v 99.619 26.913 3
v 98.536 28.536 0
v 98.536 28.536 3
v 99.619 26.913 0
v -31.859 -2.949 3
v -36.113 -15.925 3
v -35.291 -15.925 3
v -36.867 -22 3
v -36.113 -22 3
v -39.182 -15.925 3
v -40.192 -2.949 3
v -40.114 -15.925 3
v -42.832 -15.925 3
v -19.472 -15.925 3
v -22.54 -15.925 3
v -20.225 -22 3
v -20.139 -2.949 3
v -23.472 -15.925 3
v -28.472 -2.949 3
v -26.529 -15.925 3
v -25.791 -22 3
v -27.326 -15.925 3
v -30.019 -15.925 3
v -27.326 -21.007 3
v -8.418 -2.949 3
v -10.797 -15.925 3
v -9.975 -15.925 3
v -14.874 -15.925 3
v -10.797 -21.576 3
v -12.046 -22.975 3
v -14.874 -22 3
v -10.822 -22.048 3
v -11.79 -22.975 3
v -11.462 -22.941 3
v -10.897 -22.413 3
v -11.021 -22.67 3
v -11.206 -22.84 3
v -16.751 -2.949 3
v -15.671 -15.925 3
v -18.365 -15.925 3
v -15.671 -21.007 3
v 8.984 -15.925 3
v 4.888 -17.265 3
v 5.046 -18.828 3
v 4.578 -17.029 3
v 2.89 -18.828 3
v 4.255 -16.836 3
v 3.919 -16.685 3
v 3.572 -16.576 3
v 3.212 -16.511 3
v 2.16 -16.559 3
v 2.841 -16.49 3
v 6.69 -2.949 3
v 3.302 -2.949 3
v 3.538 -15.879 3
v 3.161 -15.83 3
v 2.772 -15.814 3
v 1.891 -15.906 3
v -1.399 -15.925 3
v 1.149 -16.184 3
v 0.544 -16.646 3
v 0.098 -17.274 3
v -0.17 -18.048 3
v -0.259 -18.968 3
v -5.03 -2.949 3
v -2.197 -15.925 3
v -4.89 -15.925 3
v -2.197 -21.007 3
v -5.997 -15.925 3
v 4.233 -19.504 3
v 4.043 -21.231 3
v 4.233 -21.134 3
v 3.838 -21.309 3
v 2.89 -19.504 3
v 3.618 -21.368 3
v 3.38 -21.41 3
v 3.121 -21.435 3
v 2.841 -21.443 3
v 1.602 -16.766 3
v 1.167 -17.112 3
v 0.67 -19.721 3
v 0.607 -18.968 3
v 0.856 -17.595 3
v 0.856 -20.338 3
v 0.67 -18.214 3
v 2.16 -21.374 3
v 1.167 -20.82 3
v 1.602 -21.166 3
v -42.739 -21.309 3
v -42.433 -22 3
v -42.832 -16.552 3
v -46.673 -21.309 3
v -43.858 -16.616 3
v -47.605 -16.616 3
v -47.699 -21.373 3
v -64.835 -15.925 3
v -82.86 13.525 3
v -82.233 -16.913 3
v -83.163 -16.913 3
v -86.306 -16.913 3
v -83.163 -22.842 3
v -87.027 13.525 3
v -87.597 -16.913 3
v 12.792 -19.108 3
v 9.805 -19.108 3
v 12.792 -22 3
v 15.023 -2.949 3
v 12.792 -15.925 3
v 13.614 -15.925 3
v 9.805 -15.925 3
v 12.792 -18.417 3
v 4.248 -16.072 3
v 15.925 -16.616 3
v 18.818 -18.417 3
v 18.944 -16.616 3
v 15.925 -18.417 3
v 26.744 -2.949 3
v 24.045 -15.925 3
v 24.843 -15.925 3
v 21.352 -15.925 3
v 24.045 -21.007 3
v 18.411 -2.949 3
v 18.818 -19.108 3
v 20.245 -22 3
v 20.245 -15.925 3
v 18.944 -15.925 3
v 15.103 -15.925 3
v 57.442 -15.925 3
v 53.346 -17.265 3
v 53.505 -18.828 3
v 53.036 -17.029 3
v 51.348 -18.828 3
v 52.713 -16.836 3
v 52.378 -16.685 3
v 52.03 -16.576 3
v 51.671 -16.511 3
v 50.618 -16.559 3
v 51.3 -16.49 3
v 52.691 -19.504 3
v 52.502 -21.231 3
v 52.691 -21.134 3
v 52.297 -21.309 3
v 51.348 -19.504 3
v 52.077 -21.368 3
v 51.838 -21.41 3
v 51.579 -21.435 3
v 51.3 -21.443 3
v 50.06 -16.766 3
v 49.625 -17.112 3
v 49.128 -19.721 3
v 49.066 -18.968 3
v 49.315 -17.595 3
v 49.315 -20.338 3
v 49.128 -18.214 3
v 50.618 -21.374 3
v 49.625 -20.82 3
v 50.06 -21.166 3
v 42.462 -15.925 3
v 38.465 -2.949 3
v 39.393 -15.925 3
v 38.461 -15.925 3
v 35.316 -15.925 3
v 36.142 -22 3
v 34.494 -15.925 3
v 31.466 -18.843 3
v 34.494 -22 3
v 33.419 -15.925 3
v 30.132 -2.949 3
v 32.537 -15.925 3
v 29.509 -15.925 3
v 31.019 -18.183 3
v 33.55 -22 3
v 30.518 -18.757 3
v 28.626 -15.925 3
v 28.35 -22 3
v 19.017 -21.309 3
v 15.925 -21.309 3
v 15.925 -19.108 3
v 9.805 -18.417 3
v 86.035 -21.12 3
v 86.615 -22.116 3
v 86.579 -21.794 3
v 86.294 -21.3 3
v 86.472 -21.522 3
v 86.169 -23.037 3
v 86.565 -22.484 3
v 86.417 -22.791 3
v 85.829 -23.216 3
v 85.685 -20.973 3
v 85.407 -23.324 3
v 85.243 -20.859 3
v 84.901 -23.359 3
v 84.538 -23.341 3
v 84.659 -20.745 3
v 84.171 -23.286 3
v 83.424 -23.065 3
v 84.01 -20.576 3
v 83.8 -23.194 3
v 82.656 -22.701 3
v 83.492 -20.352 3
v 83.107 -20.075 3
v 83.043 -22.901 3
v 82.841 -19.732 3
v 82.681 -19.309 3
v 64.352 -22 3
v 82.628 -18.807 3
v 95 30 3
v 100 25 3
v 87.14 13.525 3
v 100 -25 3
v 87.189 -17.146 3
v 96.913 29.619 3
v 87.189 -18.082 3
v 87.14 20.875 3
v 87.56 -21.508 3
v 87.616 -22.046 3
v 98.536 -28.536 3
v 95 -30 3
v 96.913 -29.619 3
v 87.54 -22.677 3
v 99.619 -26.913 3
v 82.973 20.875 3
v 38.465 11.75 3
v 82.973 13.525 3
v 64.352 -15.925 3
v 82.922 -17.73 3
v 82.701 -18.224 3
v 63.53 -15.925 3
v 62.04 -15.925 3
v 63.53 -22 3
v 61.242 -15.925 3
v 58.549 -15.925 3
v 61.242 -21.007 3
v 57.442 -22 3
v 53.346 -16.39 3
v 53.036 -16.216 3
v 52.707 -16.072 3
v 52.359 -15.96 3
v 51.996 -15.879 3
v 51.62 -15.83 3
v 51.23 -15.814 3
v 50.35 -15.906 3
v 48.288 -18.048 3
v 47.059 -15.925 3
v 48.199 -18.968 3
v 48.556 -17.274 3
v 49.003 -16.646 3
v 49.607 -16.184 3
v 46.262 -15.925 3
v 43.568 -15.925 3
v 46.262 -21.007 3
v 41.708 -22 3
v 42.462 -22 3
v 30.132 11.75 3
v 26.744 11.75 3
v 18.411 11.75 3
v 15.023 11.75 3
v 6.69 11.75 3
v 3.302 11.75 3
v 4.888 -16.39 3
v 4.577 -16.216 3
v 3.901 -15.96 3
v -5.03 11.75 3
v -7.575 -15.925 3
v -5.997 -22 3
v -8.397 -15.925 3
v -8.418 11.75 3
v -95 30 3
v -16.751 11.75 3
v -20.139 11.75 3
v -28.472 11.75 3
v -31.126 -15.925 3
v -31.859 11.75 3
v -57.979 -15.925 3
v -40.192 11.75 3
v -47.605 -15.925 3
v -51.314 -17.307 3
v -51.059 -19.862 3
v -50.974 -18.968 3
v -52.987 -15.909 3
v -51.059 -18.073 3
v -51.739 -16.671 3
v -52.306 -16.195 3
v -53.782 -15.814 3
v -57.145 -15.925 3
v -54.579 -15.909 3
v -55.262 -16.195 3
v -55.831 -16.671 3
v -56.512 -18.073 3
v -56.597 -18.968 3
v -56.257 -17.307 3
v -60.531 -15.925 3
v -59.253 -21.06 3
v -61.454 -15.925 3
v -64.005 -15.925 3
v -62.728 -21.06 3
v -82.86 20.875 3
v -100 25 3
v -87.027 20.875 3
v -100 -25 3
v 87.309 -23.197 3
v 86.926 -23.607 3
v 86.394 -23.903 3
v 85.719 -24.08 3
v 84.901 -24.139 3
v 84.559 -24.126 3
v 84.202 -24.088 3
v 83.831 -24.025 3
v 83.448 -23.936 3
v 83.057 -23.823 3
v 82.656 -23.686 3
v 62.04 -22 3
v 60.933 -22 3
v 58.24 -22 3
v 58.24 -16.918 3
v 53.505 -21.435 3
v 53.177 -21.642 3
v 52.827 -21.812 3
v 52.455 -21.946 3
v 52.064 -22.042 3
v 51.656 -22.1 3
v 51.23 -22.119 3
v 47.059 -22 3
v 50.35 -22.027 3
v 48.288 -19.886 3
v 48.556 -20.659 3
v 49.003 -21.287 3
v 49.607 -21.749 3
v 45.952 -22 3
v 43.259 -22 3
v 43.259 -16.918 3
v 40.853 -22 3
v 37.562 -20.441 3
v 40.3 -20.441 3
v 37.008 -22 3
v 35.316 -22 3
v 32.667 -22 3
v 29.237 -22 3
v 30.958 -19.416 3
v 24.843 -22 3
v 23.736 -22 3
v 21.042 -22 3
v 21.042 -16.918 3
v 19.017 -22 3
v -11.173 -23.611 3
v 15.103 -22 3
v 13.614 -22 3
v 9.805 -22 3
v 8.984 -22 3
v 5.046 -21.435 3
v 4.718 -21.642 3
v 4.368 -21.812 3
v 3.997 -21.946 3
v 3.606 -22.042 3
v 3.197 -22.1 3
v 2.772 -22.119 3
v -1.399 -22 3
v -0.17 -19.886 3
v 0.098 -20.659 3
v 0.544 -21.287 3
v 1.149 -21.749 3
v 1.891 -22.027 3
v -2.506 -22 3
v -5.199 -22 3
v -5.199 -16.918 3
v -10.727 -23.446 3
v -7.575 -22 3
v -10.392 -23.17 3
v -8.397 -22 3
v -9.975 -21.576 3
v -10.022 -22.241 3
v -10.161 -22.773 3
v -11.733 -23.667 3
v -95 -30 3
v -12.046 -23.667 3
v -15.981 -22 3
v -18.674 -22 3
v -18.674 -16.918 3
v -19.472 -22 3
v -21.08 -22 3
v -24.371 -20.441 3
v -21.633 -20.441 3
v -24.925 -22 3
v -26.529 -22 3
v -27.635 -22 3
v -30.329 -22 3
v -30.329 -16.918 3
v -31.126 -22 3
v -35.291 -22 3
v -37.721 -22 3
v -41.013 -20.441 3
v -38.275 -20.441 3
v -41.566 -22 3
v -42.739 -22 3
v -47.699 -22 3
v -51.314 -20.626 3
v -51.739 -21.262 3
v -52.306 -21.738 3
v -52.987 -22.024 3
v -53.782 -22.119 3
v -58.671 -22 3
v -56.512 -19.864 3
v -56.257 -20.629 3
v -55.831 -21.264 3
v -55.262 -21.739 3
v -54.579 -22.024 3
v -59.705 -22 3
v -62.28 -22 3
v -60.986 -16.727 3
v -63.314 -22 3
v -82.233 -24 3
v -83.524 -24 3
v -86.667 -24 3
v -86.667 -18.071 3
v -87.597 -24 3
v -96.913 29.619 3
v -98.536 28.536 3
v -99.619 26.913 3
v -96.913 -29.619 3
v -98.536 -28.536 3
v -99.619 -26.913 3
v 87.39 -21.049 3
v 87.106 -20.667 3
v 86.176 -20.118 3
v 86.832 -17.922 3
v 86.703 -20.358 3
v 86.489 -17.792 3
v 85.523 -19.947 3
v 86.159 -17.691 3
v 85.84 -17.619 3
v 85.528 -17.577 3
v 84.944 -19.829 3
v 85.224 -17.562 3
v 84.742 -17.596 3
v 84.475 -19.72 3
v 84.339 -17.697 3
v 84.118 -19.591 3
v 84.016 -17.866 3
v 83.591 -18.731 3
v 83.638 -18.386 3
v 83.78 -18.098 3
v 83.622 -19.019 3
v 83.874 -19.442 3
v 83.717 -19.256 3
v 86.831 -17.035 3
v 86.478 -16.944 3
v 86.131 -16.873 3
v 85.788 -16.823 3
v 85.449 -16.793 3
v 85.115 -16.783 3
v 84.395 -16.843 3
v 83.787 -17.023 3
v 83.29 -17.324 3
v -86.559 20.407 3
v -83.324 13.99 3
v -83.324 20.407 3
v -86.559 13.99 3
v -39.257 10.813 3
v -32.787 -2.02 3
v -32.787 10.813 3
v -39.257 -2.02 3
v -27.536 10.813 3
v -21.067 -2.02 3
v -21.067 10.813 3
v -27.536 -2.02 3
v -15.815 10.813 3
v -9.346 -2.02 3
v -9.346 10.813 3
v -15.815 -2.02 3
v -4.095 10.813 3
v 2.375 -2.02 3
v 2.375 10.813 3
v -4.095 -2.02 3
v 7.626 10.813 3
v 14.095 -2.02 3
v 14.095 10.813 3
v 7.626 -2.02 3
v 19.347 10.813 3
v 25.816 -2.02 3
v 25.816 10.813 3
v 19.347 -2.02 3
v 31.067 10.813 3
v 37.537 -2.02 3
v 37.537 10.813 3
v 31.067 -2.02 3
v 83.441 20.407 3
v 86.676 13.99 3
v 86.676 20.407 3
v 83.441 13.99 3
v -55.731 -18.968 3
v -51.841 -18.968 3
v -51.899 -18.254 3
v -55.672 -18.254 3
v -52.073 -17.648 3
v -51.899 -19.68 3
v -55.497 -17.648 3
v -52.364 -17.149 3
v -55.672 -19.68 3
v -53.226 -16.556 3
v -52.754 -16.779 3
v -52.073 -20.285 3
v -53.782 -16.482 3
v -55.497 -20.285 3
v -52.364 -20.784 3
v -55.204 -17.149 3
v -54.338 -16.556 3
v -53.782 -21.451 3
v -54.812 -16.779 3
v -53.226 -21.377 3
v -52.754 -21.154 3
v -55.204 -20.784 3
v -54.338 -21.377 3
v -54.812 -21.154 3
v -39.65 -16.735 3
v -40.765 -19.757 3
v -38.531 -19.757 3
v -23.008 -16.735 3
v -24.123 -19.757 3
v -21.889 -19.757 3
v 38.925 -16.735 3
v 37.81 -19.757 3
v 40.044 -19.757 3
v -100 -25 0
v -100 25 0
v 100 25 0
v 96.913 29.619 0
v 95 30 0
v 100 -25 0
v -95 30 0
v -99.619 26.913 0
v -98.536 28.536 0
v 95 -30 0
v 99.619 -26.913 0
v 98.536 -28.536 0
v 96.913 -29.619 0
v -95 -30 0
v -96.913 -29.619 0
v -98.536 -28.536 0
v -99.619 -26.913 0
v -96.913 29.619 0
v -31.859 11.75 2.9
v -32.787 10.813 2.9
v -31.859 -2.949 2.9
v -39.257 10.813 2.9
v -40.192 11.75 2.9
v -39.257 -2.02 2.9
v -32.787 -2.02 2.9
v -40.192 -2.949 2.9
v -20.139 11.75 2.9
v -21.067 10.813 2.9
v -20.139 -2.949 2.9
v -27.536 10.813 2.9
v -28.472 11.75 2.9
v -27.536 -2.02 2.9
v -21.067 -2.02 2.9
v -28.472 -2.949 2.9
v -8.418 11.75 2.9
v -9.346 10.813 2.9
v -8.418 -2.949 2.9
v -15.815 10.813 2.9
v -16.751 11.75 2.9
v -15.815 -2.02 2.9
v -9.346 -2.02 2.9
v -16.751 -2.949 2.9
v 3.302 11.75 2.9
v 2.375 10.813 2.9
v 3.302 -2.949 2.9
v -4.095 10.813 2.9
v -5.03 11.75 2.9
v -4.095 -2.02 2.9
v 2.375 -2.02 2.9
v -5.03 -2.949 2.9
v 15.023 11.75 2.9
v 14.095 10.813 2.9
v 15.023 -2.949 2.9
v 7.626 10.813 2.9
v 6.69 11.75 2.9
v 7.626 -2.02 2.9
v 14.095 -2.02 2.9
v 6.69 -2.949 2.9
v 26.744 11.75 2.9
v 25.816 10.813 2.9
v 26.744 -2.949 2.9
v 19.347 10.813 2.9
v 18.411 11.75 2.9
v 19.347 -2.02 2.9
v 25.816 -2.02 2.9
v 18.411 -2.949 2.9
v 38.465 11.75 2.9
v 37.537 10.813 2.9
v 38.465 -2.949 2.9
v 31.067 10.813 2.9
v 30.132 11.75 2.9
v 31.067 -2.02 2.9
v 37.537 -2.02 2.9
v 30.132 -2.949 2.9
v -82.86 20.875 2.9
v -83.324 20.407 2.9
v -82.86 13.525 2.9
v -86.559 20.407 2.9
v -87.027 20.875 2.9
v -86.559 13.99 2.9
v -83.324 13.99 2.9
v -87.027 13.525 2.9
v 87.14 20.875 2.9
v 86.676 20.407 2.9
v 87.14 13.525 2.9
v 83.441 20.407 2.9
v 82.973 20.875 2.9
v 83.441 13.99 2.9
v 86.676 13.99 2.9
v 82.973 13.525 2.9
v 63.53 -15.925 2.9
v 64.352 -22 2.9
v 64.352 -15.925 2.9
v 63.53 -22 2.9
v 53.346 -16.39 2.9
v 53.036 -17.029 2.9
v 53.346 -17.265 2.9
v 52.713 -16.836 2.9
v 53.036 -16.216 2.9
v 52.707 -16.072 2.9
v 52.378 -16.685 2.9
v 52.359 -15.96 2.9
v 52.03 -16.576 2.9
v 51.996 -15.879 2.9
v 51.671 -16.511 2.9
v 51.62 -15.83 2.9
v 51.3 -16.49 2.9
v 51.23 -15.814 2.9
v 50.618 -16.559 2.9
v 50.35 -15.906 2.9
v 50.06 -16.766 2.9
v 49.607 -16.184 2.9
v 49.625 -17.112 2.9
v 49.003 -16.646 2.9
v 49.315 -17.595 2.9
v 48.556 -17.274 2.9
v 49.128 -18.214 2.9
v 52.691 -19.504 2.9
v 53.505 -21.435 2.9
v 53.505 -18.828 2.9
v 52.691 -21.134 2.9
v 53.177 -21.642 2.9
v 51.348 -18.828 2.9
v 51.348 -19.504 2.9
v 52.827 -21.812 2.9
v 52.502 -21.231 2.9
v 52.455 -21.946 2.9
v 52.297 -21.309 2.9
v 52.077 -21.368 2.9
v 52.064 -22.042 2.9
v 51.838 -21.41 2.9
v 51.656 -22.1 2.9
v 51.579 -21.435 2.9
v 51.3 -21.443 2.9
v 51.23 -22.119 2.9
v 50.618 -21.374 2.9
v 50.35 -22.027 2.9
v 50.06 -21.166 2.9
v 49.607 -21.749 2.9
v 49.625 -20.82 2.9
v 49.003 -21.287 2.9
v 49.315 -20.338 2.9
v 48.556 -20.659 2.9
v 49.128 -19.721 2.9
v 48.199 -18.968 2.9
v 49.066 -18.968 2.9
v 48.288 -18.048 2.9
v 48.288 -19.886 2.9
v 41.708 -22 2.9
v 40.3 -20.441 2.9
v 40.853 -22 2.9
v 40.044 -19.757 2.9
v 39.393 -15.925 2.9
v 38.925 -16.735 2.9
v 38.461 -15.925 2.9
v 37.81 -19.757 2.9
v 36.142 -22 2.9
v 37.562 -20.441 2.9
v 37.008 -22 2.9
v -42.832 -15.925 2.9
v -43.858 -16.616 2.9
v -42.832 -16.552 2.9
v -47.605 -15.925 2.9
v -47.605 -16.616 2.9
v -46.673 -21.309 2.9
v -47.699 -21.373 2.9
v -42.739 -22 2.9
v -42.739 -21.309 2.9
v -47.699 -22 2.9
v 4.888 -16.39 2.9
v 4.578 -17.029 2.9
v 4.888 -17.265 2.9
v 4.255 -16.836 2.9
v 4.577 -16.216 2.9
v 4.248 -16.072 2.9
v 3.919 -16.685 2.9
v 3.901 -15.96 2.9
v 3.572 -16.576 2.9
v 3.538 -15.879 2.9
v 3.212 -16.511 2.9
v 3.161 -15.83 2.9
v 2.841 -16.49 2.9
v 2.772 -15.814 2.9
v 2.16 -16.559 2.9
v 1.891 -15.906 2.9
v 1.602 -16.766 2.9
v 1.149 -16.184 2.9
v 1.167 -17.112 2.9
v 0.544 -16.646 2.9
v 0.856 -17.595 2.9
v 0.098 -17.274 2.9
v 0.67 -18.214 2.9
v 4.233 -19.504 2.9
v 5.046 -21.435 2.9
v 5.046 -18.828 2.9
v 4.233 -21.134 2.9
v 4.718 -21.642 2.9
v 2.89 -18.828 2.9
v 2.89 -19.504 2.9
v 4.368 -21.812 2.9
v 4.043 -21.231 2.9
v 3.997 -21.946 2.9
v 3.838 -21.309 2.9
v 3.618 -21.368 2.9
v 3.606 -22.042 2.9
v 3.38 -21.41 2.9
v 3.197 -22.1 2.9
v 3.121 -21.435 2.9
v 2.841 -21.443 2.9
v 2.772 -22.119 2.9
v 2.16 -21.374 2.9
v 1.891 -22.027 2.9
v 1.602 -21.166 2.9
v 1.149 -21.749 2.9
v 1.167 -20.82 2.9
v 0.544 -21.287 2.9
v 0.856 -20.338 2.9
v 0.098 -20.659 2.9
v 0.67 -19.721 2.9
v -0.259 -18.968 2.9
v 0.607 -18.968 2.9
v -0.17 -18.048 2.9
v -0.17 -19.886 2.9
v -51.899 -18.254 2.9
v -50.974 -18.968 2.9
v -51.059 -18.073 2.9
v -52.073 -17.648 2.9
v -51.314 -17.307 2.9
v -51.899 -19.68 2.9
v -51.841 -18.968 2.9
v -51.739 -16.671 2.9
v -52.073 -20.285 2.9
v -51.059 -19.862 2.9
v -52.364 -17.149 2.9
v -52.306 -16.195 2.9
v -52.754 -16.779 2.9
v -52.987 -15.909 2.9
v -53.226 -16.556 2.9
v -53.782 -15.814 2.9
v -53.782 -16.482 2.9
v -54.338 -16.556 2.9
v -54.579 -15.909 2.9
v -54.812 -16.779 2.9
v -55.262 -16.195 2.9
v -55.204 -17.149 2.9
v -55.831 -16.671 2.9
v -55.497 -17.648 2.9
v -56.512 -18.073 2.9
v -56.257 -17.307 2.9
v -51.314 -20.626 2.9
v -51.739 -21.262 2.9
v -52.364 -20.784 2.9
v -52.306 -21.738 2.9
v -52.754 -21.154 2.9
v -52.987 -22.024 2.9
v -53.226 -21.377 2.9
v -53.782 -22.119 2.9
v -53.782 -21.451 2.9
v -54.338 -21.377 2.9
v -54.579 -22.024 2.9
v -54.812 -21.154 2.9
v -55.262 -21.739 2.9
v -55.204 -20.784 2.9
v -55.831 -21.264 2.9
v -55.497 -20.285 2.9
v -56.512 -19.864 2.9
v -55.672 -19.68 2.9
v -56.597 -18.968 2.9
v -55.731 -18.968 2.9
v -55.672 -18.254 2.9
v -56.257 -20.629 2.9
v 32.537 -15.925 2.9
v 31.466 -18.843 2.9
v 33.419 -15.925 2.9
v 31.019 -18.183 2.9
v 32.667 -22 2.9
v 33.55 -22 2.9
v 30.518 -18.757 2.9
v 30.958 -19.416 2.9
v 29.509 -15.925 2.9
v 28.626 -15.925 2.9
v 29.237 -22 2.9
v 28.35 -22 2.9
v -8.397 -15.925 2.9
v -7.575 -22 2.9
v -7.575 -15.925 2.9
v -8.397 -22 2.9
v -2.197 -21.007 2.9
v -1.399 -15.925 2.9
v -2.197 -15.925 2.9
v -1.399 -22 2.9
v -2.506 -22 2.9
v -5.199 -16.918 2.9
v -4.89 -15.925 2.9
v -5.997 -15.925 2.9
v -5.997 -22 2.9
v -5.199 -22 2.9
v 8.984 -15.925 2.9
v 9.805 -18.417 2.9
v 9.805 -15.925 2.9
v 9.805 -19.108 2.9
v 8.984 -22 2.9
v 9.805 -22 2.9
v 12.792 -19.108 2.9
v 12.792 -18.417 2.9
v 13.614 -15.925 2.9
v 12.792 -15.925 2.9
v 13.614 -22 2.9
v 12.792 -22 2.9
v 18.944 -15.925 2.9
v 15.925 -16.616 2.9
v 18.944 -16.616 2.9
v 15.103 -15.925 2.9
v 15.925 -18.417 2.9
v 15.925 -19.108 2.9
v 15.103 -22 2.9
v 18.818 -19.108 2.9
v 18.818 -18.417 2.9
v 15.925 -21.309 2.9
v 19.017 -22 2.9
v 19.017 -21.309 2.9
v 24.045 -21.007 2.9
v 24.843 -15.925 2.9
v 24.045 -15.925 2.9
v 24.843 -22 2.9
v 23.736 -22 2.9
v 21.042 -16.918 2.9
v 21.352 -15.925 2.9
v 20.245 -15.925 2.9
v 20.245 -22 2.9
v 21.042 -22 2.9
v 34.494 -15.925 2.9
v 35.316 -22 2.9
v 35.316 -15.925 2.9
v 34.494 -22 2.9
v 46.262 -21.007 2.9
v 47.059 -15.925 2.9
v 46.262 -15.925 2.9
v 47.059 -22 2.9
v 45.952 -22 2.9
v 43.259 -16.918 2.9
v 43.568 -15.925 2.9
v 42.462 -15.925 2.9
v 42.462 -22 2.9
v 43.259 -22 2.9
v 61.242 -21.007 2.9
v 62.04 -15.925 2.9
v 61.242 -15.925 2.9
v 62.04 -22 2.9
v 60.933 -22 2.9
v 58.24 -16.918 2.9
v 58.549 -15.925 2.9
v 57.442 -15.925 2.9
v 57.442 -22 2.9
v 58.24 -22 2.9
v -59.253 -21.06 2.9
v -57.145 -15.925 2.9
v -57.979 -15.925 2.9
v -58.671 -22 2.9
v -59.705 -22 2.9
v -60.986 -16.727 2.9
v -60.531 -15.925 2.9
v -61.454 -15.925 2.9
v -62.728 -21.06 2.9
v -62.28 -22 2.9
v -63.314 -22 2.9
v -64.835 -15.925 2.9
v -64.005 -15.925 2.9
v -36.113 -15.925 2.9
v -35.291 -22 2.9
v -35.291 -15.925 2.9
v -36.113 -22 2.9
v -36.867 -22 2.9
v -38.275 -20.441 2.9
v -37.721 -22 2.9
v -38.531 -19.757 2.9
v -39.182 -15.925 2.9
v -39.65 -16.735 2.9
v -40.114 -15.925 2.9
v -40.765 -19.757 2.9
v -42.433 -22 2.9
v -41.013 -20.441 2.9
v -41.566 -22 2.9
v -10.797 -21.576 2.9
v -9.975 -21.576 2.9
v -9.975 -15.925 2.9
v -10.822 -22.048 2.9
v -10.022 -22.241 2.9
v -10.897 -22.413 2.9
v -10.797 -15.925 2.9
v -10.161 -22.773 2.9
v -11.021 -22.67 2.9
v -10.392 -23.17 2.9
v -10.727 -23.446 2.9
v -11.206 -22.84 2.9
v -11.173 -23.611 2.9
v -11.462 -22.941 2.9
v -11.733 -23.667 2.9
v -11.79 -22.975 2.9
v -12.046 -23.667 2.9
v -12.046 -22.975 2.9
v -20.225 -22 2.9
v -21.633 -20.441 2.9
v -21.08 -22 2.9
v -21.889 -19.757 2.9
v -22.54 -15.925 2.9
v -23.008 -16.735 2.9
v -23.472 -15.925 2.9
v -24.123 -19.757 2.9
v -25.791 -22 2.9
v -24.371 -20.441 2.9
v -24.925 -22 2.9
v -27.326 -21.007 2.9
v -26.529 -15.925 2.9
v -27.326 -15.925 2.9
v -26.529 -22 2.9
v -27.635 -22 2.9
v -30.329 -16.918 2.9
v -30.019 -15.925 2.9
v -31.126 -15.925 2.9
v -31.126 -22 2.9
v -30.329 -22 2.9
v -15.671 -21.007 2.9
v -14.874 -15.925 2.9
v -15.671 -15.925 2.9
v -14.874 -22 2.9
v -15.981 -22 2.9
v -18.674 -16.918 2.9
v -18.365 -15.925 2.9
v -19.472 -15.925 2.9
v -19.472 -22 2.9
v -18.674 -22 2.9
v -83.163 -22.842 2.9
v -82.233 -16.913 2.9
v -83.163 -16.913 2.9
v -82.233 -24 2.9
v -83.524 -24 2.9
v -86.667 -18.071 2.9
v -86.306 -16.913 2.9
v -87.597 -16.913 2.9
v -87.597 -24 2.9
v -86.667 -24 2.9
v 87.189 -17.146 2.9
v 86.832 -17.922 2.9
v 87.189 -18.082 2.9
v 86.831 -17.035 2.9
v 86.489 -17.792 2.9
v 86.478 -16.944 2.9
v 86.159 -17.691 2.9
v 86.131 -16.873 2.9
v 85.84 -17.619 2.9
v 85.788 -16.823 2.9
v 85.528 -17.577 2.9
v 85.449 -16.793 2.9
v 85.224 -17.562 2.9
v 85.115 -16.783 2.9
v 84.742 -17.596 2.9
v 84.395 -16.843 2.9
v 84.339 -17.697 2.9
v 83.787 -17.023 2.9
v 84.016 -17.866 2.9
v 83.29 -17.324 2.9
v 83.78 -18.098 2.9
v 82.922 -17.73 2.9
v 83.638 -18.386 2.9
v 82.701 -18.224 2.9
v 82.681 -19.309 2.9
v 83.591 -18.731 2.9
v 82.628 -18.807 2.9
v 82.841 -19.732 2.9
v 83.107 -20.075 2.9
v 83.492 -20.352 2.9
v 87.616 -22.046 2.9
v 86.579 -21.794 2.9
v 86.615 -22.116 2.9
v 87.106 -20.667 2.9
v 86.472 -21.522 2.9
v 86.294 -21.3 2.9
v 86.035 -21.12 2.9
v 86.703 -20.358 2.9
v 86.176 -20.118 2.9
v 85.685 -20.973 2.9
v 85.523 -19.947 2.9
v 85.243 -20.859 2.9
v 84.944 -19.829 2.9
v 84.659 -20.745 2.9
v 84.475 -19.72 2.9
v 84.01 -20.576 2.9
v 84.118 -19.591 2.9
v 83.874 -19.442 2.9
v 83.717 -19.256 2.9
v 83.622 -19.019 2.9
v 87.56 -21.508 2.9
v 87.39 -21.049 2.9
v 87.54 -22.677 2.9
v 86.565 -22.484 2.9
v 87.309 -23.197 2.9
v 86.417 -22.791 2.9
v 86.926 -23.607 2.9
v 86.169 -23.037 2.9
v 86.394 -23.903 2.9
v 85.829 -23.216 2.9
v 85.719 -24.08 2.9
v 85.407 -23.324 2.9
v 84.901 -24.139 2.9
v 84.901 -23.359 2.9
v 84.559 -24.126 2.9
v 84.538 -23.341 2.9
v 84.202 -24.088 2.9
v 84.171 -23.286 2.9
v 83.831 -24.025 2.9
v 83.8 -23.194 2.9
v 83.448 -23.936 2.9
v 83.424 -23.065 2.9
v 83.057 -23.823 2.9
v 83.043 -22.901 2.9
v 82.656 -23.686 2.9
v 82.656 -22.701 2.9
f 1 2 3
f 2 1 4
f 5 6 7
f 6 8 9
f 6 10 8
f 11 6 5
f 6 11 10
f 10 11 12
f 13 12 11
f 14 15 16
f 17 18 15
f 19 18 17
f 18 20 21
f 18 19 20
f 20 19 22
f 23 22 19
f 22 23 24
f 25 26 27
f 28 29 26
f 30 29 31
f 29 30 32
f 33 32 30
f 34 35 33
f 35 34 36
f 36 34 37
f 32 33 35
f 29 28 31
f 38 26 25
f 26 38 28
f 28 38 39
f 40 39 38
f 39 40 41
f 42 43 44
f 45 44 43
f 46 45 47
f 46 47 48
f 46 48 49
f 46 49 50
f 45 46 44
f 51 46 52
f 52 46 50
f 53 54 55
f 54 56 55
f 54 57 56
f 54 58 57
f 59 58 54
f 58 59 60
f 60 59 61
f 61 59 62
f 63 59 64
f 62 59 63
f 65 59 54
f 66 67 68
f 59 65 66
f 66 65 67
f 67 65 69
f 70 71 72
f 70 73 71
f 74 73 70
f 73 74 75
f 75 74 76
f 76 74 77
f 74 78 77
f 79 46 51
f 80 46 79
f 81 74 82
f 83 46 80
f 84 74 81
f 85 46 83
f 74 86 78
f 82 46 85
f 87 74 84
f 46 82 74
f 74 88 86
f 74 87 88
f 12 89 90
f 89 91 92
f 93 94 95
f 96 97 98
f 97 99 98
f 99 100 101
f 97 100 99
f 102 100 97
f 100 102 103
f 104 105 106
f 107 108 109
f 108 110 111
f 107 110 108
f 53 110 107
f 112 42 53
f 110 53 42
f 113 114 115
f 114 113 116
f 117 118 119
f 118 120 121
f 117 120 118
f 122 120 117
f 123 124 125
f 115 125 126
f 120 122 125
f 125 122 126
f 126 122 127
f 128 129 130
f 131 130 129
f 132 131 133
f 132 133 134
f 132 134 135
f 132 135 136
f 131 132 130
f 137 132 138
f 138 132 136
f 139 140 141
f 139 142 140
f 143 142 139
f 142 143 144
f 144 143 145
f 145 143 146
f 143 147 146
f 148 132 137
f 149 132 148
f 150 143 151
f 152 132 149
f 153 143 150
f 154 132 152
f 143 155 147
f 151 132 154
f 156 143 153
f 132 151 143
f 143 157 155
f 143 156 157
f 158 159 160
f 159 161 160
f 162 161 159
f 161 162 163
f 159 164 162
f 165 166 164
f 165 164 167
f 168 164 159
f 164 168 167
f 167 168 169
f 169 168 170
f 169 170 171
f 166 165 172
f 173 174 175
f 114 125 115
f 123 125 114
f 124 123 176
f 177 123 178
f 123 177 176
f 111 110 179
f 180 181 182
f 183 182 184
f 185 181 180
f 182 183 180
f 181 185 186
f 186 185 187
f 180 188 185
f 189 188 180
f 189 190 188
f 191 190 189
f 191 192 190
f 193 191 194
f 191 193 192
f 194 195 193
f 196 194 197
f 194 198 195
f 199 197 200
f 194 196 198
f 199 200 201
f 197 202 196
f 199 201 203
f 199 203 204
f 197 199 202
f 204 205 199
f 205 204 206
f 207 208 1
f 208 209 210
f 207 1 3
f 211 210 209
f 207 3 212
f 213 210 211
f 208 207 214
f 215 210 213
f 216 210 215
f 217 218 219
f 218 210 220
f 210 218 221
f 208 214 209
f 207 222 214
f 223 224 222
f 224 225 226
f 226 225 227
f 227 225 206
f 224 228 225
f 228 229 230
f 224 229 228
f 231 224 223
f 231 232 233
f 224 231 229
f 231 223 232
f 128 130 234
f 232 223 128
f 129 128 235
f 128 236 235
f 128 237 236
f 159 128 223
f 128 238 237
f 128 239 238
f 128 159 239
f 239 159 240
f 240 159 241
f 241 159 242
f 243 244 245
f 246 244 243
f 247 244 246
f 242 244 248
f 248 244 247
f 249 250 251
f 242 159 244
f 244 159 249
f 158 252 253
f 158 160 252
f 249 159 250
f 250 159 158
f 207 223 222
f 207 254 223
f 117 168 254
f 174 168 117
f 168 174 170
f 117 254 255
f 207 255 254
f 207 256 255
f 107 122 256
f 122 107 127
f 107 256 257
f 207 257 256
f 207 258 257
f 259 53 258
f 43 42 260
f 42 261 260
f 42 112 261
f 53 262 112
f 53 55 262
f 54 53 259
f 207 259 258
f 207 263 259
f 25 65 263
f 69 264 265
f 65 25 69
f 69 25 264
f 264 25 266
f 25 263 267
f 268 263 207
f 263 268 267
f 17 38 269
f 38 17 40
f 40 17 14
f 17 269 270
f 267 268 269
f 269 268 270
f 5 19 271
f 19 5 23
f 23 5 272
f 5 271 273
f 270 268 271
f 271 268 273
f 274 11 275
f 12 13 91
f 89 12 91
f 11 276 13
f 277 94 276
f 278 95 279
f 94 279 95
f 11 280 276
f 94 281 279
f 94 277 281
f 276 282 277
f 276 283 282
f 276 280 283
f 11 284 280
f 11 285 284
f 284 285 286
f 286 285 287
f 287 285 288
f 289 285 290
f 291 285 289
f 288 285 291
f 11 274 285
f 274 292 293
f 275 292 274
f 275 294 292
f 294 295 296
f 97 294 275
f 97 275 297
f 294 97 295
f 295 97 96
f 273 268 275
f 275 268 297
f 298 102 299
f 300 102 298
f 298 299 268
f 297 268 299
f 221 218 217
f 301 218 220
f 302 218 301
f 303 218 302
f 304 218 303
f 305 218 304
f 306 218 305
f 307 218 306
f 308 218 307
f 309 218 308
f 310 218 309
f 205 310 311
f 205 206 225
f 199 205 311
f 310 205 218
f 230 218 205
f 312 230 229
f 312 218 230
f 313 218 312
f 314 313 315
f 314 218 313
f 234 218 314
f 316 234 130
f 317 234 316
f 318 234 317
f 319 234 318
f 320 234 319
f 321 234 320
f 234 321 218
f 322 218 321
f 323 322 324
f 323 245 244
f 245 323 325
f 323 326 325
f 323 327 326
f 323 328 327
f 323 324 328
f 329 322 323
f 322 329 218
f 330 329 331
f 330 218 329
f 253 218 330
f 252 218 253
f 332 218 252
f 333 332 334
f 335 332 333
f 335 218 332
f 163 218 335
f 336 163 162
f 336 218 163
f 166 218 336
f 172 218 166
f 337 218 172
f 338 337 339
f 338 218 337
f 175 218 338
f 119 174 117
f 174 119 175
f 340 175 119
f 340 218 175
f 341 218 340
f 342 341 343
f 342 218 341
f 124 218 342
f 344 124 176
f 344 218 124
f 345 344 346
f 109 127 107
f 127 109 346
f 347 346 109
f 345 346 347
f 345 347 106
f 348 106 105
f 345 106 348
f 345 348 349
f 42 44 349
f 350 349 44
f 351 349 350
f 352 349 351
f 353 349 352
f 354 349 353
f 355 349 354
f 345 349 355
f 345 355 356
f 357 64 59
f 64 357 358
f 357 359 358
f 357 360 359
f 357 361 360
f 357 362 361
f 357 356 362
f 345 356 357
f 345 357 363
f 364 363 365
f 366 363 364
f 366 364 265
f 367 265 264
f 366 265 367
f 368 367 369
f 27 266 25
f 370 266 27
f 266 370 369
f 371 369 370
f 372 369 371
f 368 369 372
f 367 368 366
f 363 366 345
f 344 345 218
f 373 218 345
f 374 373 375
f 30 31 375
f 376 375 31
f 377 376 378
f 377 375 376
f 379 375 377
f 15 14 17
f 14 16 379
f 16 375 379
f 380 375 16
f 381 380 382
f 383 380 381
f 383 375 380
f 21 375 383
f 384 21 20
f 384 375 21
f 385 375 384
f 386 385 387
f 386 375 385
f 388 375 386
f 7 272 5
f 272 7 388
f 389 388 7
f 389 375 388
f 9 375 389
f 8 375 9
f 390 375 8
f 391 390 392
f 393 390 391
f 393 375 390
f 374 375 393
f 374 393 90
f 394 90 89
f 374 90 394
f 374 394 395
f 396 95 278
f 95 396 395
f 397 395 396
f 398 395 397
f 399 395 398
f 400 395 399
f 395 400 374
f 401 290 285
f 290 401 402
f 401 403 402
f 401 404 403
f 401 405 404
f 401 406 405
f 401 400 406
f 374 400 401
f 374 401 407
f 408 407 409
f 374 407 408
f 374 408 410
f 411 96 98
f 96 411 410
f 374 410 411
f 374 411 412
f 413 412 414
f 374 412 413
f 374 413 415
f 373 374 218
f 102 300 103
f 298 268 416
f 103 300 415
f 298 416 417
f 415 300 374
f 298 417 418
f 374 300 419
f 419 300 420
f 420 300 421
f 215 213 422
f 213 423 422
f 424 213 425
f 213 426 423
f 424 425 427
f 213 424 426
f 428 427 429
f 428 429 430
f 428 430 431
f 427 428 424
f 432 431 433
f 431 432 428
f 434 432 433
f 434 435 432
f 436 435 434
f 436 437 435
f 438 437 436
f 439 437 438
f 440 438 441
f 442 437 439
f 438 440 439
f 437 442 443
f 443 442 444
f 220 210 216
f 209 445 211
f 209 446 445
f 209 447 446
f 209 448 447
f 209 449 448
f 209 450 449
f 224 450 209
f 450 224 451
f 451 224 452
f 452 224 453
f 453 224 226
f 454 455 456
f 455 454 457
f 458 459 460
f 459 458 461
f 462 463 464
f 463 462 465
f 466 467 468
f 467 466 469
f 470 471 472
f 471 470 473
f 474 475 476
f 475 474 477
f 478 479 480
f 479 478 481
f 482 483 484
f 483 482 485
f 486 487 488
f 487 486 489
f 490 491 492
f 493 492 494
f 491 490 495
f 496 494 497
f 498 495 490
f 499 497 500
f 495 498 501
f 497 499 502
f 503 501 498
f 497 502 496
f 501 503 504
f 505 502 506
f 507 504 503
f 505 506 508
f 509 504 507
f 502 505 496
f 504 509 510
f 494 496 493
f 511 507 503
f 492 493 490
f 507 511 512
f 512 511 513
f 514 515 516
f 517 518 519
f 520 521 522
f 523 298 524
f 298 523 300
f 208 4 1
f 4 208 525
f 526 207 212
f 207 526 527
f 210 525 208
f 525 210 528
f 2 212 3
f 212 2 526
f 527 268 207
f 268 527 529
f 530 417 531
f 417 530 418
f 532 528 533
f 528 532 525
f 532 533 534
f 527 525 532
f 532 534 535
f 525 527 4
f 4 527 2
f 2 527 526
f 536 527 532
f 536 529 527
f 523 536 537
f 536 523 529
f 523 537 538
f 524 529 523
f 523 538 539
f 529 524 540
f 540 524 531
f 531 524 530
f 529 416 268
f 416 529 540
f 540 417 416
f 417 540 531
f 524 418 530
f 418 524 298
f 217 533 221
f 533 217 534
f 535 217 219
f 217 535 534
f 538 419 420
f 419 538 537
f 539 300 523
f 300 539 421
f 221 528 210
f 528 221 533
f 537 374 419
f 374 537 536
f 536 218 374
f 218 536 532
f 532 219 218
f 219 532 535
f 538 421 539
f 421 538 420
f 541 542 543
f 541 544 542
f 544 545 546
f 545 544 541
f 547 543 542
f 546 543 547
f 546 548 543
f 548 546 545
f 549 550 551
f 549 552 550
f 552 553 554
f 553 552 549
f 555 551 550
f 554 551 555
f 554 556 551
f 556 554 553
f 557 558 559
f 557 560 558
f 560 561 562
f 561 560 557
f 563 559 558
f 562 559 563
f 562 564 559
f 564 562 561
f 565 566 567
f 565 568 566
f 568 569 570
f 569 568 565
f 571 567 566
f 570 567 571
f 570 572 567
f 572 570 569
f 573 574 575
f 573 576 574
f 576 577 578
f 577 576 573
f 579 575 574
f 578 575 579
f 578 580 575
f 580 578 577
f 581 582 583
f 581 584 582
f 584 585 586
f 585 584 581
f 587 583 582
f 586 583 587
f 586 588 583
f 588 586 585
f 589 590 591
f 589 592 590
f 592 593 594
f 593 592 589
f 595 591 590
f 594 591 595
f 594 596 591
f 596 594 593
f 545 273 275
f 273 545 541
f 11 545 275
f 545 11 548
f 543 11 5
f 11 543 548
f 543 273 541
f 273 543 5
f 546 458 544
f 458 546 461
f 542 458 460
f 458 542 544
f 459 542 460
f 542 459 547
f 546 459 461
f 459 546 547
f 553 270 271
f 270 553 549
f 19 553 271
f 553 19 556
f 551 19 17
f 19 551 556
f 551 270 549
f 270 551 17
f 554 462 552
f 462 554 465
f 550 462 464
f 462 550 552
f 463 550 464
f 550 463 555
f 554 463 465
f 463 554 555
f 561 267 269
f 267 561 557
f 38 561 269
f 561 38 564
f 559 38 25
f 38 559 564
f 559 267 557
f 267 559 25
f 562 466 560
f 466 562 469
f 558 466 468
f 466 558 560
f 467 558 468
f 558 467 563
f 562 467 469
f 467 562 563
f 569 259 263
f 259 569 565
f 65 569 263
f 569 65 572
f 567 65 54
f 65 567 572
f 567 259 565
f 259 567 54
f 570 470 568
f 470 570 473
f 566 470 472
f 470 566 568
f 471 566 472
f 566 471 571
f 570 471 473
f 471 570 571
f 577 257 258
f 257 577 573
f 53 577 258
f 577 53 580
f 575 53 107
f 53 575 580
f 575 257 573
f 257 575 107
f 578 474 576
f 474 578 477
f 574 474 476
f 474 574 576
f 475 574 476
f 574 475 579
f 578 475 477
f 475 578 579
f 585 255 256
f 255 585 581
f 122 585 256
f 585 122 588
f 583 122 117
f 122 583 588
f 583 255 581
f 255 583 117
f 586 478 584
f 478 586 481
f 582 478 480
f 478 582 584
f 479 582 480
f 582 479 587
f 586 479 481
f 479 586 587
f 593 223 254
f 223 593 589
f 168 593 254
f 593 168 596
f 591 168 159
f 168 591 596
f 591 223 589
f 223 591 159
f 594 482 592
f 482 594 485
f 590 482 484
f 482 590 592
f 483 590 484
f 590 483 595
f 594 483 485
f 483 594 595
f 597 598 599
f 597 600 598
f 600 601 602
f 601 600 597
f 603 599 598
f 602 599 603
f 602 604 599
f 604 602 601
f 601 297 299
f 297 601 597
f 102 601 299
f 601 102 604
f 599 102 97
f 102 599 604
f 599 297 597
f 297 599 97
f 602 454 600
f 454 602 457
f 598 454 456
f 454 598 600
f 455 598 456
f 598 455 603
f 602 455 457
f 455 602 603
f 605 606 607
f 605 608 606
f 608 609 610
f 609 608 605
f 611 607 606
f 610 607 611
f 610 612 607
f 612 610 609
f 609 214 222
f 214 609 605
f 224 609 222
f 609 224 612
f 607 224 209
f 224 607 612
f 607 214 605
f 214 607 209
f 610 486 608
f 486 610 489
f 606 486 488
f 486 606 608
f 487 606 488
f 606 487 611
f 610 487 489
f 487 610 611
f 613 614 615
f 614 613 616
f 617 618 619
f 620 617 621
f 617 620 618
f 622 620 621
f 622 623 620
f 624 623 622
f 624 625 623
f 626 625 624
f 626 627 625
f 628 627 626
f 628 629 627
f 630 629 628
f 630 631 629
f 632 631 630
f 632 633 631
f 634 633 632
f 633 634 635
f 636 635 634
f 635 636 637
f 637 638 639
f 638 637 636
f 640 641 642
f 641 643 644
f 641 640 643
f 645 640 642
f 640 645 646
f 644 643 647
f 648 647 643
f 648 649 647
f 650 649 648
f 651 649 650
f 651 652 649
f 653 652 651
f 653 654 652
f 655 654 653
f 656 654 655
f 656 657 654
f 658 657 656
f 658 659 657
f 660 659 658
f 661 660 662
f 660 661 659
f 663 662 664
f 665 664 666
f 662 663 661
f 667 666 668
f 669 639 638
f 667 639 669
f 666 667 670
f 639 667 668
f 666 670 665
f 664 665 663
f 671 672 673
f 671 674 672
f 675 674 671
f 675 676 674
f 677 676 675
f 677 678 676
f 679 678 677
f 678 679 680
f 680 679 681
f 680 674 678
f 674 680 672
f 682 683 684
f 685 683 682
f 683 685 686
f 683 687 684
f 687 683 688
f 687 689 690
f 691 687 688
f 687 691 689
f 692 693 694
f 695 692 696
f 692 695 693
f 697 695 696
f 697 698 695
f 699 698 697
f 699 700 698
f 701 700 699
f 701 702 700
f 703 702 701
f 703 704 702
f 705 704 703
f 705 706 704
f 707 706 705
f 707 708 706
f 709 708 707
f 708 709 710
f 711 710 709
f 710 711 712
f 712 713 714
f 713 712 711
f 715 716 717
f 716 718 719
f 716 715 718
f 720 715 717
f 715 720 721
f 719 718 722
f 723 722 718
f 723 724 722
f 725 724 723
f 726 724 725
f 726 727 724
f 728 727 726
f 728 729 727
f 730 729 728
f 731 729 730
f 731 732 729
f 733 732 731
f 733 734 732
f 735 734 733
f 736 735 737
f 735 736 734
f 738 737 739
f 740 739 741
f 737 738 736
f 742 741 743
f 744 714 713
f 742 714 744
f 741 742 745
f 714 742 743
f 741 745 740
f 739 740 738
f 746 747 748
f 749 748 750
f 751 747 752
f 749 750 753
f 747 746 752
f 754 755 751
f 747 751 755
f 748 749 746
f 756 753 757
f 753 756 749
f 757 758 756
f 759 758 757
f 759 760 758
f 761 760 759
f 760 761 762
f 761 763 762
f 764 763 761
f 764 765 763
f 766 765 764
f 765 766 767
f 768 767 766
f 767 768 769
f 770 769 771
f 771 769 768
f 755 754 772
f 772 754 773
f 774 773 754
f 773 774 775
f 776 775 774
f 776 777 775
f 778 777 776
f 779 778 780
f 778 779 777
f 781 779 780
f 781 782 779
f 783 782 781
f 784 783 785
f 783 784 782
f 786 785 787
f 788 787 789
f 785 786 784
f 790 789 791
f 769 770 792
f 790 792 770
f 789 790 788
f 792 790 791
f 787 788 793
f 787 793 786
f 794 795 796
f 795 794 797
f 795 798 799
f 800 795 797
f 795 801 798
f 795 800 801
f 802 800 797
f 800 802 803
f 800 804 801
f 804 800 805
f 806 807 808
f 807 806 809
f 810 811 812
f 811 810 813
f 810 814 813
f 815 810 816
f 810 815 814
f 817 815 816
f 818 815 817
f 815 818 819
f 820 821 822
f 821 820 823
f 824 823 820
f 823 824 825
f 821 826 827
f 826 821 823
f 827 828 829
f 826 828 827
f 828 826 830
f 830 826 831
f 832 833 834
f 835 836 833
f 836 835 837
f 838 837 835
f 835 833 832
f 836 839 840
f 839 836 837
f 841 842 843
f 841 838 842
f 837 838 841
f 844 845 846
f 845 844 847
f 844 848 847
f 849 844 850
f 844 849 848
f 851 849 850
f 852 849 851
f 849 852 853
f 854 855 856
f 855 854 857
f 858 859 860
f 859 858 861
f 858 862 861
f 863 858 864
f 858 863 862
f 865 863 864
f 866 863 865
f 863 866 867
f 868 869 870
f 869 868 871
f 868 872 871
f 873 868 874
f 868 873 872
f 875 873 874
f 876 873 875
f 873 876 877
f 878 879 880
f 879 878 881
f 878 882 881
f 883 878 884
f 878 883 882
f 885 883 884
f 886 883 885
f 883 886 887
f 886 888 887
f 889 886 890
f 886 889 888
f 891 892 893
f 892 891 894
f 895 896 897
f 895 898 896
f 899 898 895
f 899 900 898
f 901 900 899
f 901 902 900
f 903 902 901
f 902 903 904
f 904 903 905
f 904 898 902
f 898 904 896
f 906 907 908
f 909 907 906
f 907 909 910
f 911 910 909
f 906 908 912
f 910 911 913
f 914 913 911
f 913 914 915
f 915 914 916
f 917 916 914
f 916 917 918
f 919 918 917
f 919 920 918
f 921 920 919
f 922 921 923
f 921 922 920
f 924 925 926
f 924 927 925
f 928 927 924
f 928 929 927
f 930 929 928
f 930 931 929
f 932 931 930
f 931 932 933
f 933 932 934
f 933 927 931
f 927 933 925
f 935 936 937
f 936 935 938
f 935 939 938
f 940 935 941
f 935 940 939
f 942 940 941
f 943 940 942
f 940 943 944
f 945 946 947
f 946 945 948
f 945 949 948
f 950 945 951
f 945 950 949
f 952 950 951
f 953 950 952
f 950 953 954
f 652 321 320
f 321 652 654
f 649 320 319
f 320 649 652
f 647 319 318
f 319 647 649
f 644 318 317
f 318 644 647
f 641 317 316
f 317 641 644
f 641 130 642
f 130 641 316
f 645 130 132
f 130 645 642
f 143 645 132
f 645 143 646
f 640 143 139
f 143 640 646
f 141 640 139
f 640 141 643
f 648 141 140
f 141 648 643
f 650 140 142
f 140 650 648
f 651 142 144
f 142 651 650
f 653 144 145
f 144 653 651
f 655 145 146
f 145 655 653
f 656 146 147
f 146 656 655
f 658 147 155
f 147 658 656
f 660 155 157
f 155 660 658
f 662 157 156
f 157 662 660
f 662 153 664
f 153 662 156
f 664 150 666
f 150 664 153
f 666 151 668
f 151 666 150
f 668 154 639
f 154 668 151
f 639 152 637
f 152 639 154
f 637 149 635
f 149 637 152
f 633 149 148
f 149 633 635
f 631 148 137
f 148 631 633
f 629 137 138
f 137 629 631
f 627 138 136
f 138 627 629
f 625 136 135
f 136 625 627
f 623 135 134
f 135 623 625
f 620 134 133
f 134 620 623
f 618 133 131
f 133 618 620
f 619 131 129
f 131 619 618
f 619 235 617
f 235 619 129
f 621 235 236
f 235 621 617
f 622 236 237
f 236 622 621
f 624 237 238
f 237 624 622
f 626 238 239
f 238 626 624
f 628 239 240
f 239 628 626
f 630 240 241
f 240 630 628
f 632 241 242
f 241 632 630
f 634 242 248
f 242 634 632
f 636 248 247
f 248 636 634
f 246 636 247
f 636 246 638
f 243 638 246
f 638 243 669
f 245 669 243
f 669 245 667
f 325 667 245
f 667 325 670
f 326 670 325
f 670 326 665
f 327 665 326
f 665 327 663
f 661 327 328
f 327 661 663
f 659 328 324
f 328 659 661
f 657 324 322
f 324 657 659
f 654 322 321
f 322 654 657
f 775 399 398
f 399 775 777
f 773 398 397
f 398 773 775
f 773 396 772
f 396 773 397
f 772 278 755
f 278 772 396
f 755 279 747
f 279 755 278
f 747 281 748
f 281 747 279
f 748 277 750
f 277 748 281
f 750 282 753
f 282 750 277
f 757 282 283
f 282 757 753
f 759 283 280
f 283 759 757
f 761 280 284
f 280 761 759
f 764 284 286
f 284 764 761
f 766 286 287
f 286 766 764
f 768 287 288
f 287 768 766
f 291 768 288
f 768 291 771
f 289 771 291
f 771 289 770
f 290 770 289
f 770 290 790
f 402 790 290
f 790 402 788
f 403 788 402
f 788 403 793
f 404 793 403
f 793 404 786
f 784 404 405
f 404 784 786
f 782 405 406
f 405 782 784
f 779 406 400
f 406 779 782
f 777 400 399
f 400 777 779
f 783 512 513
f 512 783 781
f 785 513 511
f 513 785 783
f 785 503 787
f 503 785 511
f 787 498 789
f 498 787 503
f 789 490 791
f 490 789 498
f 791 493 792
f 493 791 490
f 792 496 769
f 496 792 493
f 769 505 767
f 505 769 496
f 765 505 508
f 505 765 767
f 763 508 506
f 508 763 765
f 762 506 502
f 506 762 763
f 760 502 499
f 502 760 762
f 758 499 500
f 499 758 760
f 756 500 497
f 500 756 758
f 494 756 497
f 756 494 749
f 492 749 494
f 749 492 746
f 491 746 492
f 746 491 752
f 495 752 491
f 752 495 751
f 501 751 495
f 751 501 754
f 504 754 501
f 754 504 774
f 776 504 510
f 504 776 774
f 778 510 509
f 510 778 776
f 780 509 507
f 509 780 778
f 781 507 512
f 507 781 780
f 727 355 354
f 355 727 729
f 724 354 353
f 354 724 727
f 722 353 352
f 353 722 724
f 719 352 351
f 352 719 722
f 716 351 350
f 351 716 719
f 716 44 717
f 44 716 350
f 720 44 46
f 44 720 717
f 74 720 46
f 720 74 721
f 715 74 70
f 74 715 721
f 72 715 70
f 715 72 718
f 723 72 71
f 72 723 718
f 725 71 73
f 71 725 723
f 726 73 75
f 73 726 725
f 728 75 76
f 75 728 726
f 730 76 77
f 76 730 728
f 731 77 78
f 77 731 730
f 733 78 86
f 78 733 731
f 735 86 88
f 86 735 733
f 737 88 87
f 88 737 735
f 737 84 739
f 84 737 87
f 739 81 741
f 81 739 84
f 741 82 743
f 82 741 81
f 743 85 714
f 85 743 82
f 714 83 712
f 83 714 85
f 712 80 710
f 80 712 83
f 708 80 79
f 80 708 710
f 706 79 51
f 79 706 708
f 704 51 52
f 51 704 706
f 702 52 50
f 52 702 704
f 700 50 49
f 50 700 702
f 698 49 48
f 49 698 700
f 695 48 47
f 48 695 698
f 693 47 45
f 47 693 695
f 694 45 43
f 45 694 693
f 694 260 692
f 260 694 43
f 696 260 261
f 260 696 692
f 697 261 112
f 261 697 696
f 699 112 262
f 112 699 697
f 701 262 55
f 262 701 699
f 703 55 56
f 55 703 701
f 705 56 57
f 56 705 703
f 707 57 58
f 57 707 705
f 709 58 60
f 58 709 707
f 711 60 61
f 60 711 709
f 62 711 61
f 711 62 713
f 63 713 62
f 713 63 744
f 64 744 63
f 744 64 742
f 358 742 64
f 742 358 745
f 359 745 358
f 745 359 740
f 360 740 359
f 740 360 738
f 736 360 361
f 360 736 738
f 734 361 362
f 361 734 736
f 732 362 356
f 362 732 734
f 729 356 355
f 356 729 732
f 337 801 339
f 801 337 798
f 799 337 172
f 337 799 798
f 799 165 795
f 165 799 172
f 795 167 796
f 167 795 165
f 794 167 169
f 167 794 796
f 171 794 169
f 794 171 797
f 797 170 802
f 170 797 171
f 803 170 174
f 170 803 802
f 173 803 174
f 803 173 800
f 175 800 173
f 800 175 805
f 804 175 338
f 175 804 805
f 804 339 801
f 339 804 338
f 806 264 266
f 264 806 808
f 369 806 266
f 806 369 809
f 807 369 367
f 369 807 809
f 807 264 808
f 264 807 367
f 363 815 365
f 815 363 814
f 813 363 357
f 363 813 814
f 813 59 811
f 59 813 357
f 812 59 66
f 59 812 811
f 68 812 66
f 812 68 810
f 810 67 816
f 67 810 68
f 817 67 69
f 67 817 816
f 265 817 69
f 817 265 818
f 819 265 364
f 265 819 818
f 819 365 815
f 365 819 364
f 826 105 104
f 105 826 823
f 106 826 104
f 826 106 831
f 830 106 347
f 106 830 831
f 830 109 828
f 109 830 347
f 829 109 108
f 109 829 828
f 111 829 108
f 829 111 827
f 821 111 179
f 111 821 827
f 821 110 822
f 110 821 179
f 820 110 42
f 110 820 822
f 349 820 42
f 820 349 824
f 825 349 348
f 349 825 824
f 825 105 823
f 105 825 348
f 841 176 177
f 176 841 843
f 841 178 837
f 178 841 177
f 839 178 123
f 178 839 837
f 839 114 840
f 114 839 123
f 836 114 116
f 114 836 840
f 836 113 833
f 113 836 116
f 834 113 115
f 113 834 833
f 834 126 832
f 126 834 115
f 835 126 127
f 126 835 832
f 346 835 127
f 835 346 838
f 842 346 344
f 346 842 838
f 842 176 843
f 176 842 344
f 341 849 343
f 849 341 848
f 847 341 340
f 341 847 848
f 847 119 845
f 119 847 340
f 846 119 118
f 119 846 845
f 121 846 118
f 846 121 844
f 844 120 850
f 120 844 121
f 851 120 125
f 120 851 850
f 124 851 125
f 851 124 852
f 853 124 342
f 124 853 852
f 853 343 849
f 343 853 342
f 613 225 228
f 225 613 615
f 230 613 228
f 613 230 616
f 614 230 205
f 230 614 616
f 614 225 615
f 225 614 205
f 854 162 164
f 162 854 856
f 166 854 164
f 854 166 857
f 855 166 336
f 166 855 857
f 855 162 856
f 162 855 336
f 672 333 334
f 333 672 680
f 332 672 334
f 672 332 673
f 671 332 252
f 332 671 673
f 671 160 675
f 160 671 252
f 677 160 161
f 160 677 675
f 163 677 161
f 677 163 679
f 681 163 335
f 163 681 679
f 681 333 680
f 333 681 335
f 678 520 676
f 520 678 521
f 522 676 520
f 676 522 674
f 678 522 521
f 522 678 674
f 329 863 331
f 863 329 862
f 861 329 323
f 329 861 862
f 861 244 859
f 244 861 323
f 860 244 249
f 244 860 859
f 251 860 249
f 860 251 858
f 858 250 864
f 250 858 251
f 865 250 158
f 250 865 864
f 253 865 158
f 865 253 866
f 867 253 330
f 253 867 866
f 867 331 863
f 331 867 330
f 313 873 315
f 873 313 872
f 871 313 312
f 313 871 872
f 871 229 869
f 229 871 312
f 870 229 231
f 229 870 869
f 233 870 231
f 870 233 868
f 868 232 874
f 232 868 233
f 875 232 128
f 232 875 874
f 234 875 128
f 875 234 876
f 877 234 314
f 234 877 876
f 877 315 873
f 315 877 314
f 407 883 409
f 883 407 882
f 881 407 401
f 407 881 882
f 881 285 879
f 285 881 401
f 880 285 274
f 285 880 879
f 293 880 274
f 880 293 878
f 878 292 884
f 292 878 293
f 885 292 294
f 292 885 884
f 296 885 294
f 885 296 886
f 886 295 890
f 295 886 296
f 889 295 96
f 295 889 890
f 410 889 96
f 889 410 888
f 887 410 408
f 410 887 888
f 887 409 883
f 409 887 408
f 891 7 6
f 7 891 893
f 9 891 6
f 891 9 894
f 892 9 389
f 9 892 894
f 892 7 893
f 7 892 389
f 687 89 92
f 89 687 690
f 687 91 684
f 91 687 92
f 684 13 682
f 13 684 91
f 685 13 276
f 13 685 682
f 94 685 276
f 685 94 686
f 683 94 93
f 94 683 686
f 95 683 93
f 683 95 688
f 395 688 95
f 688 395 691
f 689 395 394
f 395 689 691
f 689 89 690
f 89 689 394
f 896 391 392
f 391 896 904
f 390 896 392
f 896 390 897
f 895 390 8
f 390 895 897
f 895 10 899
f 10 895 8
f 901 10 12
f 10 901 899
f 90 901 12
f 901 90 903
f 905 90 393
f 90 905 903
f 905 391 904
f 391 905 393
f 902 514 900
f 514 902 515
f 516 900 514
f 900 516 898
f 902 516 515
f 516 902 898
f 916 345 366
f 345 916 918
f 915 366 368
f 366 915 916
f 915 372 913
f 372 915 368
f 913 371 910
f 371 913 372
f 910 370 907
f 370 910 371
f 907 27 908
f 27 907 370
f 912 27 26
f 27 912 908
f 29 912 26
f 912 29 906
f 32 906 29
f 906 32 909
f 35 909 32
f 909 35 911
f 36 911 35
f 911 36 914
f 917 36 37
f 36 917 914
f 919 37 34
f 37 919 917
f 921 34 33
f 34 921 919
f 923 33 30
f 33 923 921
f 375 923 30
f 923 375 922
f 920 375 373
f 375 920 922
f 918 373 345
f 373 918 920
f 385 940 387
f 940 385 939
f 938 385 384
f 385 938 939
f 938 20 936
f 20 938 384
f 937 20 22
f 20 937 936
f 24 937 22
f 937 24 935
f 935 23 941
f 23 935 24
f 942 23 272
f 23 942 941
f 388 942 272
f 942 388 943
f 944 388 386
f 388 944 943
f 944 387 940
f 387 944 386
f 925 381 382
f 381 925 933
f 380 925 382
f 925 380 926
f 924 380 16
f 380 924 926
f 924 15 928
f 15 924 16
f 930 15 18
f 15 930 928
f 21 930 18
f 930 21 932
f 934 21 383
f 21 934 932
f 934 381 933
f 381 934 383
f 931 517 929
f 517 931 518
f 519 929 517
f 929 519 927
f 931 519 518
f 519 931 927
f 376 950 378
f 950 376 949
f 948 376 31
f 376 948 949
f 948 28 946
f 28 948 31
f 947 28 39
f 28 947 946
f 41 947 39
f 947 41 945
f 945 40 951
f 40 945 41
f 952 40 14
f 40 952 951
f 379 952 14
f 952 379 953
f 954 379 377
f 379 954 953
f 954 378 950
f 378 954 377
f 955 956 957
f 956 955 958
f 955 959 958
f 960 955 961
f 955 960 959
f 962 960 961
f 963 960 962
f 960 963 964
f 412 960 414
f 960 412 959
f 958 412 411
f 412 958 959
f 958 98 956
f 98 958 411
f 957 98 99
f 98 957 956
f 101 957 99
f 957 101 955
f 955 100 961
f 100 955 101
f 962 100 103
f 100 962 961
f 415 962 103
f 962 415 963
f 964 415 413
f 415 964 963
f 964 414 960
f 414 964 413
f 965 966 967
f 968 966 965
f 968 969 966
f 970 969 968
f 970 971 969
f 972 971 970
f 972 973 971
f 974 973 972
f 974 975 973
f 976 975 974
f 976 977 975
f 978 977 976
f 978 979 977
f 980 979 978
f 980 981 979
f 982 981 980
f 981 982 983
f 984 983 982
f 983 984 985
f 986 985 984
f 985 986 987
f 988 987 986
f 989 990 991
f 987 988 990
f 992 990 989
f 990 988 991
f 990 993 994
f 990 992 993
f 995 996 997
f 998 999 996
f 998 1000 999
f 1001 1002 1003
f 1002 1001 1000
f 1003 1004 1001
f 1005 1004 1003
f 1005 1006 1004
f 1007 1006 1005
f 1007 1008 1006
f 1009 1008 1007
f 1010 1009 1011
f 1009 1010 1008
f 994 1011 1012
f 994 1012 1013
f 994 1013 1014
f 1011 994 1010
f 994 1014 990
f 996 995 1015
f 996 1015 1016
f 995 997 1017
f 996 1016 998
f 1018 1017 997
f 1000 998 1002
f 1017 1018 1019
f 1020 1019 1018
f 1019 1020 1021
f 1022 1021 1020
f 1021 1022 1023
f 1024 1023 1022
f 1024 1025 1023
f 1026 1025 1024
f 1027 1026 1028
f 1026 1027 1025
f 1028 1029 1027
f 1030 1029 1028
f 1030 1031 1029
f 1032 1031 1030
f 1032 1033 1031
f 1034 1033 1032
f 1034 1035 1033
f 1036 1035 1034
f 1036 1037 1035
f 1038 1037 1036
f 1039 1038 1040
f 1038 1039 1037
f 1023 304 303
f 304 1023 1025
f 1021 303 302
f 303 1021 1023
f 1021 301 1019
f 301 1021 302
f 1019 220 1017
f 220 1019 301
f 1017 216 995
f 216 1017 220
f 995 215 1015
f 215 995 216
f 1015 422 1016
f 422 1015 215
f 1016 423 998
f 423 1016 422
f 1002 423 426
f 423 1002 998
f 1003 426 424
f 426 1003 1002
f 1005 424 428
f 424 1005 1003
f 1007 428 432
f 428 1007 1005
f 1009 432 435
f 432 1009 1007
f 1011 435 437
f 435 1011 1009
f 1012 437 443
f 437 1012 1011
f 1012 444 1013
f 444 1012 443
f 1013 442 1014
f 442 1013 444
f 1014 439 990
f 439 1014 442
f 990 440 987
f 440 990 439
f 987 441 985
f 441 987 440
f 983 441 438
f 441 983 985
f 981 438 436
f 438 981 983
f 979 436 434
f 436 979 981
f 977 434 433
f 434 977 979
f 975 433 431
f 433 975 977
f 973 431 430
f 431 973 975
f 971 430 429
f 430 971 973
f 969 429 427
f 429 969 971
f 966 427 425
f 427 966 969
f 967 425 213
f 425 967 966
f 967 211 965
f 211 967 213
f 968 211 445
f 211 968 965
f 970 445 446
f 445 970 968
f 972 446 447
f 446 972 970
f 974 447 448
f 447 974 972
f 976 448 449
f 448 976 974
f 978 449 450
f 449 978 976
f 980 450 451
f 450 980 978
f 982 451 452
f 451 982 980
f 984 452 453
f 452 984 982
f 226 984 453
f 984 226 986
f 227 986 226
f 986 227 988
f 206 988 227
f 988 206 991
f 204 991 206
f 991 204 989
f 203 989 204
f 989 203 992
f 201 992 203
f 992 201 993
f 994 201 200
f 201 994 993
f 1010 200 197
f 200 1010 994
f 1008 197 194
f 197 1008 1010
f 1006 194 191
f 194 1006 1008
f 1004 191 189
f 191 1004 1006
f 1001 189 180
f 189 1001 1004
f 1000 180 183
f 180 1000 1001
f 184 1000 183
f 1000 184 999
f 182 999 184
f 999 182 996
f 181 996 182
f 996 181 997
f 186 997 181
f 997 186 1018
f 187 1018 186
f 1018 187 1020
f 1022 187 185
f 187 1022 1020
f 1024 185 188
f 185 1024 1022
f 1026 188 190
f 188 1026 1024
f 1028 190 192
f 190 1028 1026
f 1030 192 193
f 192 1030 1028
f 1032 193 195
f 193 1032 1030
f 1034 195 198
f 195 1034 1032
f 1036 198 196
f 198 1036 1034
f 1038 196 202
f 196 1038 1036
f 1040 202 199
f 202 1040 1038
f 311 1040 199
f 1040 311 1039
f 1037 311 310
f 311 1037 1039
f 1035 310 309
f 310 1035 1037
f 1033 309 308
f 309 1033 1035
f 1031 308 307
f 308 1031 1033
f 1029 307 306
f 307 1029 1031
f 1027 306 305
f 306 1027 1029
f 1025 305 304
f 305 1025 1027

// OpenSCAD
// 标牌参数
width = 200;  // 宽度
height = 60;  // 高度
depth = 3;    // 厚度
corner_r = 5; // 圆角半径

// 文字内容
chinese_text = "我在南京很想你";  // 中文文字
pinyin_text = "WO ZAI NAN JING HEN XIANG NI";  // 拼音文字

// 字体设置
main_font = "Noto Sans SC";  // 主要字体

// 主体
difference() {
    union() {
        // 蓝色主体部分（上面2/3）
        color("RoyalBlue")
        linear_extrude(depth)
        difference() {
            // 整体形状
            offset(r=corner_r)
            offset(r=-corner_r)
            square([width, height], center=true);
            // 减去下面1/3部分
            translate([0, -height/3])
            square([width+1, height/3], center=true);
        }
        
        // 白色底部部分（下面1/3）
        color("White")
        linear_extrude(depth)
        intersection() {
            // 整体形状
            offset(r=corner_r)
            offset(r=-corner_r)
            square([width, height], center=true);
            // 只保留下面1/3部分
            translate([0, -height/3])
            square([width+1, height/3], center=true);
        }
    }
    
    // 白色中文文字（凹入）
    color("White") {
        // 主要中文文字
        translate([0, 0, depth-0.1])
        linear_extrude(0.2)
        text(chinese_text, size=12, spacing=1.2, halign="center", font=main_font);
        
        // 北标记
        translate([-width/2+15, height/2-15, depth-0.1])
        linear_extrude(0.2)
        text("北", size=6, halign="center", font=main_font);
        
        // 南标记
        translate([width/2-15, height/2-15, depth-0.1])
        linear_extrude(0.2)
        text("南", size=6, halign="center", font=main_font);
    }
    
    // 黑色文字（凹入）
    color("Black") {
        // 拼音文字
        translate([0, -22, depth-0.1])
        linear_extrude(0.2)
        text(pinyin_text, size=6, halign="center", font=main_font);
        
        // N标记
        translate([-width/2+15, height/2-54, depth-0.1])
        linear_extrude(0.2)
        text("N", size=7, halign="center", font=main_font);
        
        // S标记
        translate([width/2-15, height/2-54, depth-0.1])
        linear_extrude(0.2)
        text("S", size=7, halign="center", font=main_font);
    }
}
